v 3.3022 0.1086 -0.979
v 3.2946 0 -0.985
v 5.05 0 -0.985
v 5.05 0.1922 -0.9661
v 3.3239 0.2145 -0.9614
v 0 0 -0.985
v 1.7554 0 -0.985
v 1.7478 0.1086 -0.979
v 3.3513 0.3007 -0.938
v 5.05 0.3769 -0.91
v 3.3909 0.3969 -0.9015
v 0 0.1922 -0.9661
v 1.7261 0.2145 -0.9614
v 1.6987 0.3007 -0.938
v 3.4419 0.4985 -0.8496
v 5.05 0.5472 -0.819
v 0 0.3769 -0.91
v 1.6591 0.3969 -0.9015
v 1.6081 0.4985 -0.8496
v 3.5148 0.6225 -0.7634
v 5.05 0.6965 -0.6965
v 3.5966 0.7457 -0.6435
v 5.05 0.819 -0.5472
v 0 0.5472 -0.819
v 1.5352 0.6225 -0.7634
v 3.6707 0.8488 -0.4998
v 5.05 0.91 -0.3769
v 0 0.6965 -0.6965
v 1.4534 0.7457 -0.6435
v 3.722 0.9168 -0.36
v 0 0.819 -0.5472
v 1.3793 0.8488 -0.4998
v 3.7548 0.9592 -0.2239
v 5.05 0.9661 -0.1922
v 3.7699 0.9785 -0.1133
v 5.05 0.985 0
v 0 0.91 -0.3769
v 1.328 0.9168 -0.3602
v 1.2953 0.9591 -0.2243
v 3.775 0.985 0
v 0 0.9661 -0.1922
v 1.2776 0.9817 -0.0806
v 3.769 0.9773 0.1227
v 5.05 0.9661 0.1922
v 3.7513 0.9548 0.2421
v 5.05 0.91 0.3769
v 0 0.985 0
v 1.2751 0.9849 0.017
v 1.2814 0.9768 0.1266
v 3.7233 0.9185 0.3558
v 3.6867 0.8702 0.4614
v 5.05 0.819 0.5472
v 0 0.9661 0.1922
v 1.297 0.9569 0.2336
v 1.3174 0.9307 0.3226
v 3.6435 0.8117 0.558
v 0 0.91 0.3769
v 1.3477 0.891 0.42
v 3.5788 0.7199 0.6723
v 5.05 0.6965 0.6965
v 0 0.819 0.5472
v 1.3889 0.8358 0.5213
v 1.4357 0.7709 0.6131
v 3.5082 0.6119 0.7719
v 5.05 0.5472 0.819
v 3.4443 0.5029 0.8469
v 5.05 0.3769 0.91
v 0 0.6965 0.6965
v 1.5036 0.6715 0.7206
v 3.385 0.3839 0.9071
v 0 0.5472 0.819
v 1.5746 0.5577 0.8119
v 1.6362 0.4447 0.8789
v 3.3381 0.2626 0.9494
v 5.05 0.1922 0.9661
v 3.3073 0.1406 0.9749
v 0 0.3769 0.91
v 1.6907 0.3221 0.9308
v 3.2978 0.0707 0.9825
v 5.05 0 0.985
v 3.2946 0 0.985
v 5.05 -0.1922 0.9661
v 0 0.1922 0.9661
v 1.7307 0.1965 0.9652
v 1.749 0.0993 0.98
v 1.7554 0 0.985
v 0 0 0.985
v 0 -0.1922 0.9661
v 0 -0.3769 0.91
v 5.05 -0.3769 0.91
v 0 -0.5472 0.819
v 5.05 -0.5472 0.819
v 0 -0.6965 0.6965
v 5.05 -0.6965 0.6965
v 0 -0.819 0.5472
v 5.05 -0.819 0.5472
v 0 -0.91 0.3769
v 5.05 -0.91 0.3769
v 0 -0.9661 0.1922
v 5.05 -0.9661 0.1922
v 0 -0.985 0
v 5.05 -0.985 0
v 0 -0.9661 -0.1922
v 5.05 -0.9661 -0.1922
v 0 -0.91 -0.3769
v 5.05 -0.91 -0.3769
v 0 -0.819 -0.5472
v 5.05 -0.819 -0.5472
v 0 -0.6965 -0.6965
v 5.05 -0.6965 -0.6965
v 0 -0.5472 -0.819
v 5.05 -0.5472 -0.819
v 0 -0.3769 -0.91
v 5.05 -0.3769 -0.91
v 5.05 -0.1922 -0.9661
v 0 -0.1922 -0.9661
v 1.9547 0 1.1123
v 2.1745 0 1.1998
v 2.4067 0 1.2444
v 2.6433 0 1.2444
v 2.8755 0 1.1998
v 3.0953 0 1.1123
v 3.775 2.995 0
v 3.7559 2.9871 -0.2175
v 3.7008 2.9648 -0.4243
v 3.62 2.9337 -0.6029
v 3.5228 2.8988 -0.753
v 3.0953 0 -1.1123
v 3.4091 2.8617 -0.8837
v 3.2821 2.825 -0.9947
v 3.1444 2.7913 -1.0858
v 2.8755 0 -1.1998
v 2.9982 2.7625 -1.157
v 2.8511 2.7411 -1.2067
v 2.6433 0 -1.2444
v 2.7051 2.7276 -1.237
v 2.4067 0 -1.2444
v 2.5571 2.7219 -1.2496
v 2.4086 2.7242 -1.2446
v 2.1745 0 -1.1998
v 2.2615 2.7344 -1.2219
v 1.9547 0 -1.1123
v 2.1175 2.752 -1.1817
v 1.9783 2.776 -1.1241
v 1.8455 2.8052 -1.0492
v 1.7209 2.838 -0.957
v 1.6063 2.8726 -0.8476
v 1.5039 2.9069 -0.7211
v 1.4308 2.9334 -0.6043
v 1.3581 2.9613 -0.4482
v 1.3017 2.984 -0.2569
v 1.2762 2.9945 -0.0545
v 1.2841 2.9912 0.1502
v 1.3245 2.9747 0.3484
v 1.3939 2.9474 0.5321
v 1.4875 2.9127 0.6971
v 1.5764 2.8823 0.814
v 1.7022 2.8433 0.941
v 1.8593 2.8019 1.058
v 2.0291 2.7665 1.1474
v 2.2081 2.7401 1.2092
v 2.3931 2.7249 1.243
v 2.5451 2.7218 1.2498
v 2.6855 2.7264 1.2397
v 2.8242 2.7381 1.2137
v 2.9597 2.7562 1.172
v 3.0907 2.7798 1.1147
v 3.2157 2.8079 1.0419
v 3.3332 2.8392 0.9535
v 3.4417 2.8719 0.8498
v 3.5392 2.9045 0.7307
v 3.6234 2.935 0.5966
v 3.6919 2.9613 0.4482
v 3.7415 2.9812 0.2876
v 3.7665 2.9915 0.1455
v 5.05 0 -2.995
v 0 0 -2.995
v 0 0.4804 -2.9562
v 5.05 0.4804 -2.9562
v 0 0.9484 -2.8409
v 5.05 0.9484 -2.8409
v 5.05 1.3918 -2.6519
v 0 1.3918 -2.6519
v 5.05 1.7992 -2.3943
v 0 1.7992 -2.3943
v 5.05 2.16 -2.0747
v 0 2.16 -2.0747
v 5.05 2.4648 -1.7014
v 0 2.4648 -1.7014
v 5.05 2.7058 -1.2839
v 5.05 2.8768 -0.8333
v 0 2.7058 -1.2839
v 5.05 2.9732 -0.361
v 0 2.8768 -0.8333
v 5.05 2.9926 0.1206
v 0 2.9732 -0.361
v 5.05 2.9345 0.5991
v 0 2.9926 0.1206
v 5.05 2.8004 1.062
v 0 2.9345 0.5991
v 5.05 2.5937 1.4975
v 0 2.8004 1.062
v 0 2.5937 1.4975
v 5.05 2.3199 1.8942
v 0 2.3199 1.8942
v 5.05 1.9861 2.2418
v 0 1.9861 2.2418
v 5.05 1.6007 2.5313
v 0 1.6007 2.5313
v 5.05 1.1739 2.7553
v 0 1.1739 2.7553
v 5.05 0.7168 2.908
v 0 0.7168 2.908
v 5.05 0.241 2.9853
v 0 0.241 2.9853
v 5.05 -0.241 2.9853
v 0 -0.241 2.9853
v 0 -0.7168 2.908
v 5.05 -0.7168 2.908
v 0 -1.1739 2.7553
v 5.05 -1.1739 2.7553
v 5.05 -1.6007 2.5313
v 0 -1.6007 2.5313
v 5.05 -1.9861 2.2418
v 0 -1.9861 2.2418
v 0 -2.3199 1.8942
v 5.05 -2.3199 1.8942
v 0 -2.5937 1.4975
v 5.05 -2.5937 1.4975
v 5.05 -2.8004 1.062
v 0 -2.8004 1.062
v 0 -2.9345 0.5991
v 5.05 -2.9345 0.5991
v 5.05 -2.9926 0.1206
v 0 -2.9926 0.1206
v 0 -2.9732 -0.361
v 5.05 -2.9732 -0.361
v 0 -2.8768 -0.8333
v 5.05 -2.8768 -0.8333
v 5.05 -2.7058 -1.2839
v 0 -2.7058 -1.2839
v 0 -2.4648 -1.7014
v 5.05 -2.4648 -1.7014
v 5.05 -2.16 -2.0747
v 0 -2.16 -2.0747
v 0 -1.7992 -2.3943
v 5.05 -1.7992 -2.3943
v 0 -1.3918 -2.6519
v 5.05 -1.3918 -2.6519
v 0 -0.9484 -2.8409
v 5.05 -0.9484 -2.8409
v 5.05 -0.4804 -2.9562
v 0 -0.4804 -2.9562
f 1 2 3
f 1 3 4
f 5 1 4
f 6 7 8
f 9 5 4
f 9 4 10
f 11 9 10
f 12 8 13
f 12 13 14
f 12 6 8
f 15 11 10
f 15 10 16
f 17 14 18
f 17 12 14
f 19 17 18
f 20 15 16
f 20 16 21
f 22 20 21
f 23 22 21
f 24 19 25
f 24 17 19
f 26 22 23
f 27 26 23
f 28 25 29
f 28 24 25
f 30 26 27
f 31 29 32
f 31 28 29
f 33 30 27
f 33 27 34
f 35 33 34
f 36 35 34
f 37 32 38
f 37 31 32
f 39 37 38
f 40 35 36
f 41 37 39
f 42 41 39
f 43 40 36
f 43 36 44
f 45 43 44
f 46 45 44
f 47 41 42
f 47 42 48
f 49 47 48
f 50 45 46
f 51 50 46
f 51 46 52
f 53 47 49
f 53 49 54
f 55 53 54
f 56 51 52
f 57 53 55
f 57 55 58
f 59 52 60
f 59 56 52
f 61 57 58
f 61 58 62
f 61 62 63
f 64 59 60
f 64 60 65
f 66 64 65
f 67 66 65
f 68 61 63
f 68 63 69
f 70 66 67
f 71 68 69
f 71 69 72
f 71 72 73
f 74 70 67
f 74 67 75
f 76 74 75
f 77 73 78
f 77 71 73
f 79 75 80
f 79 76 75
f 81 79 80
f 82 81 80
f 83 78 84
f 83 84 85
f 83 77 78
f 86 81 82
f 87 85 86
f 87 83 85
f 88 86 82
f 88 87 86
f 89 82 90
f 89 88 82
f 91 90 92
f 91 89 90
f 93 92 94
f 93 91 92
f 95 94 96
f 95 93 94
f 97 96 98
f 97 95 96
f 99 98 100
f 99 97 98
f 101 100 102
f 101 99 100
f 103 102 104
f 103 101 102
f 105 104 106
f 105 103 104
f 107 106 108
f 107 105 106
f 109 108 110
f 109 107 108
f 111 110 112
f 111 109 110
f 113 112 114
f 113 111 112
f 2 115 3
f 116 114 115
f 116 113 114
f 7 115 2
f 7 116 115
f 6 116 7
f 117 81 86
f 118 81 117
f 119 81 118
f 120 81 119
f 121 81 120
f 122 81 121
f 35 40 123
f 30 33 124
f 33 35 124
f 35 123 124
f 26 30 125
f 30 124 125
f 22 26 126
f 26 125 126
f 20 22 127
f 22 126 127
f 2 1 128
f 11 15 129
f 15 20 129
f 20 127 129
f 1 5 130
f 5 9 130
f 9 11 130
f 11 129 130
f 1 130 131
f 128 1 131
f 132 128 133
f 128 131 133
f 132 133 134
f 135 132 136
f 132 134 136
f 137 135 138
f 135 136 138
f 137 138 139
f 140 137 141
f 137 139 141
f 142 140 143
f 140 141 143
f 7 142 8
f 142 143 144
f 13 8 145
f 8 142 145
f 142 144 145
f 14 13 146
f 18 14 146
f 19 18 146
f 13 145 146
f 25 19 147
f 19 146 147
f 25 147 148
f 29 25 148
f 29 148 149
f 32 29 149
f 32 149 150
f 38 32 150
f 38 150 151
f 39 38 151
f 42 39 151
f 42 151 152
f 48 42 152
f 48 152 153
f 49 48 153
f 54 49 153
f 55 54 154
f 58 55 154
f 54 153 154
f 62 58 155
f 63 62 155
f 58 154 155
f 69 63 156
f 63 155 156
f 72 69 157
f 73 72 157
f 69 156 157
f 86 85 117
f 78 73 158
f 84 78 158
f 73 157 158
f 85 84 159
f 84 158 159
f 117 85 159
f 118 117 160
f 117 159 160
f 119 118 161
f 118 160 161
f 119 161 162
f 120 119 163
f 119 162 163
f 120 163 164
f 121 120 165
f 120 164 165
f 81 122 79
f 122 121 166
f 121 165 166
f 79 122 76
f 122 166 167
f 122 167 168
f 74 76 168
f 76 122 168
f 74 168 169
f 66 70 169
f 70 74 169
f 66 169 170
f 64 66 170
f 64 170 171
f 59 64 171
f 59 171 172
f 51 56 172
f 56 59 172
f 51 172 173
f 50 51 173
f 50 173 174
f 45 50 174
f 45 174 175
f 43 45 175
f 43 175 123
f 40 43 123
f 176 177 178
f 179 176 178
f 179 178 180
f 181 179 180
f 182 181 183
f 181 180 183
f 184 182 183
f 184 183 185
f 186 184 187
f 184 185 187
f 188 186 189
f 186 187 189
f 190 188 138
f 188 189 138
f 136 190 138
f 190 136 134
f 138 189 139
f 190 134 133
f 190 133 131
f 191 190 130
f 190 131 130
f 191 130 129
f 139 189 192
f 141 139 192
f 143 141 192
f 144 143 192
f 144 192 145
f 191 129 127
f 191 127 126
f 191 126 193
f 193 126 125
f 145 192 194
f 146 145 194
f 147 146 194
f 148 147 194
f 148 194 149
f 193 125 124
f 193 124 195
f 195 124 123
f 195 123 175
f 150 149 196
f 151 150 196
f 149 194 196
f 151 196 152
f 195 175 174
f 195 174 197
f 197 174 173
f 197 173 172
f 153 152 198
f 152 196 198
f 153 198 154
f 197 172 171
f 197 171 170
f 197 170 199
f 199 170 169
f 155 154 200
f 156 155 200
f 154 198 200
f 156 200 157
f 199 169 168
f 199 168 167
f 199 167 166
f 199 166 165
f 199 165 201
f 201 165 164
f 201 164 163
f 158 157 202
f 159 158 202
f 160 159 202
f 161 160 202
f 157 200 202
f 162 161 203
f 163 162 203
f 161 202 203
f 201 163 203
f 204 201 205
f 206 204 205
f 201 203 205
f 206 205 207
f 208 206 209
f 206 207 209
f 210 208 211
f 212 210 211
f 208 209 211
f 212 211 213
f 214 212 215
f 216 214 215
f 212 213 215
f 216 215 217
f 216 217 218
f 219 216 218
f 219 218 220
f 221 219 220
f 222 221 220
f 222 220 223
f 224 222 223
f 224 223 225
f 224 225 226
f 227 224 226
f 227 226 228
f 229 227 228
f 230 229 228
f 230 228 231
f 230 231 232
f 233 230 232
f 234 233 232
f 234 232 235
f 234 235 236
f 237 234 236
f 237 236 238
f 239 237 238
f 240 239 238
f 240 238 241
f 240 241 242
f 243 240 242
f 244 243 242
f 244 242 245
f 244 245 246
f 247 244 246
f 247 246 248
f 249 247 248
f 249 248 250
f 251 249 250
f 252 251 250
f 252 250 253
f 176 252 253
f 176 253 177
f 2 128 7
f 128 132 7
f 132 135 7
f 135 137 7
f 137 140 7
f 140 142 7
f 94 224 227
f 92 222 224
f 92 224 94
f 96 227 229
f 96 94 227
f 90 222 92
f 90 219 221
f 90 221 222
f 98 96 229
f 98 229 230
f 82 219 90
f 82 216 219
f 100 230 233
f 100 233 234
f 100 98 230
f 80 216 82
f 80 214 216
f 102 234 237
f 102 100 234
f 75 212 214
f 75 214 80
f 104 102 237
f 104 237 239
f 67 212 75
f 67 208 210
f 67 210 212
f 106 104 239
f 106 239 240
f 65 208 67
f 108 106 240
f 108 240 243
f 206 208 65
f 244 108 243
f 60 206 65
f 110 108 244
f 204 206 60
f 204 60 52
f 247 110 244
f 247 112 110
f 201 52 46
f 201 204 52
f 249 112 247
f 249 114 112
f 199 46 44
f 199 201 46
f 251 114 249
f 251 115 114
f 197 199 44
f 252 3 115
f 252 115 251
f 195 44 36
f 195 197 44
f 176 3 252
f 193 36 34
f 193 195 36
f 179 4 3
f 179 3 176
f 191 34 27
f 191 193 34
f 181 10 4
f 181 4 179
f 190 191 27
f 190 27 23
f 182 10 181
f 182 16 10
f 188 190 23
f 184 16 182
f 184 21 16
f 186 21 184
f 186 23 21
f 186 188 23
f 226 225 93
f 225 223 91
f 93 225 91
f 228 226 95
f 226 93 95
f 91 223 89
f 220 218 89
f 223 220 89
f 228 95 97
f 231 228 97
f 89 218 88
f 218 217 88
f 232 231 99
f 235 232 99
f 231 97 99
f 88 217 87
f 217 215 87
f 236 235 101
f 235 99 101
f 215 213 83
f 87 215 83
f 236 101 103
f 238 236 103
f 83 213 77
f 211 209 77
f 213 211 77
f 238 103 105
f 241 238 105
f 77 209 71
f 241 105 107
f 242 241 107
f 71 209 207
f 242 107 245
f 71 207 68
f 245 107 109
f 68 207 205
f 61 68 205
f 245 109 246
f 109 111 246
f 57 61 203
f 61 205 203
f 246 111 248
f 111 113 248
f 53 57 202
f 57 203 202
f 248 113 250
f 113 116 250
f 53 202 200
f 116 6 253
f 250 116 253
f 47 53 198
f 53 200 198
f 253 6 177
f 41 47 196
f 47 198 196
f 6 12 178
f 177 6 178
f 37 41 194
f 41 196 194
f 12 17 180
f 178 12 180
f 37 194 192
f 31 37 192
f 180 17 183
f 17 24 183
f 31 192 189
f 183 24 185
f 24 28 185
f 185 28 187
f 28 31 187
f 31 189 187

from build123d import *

# Parameters (mm, degrees)
SCHIZZO1_R                        = 2.995
SCHIZZO1_R_2                      = 0.985
ESTRUSIONE_ESTRUSIONE1_DEPTH      = 5.05
FORO_FILETTATO_M3X0_5_1_OUTLINE_W = 1.25
FORO_FILETTATO_M3X0_5_1_OUTLINE_H = 2.995111585


# Read off the part's stored shape, not the designer's step: Foro filettato M3x0.5-1
with BuildPart() as part:
    # Schizzo1 → Estrusione-Estrusione1 (new body)
    with BuildSketch(Plane(origin=(0, 0, 0), x_dir=(0, 0, -1), z_dir=(1, 0, 0))):
        Circle(SCHIZZO1_R)
        Circle(SCHIZZO1_R_2, mode=Mode.SUBTRACT)
    extrude(amount=ESTRUSIONE_ESTRUSIONE1_DEPTH)

    # Foro filettato M3x0.5-1 outline → Foro filettato M3x0.5-1 (revolve, cut)
    with BuildSketch(Plane(origin=(2.525, 0, 0), x_dir=(1, 0, 0), z_dir=(0, 0, 1))):
        with Locations((0.625, 1.497555793)):
            Rectangle(FORO_FILETTATO_M3X0_5_1_OUTLINE_W, FORO_FILETTATO_M3X0_5_1_OUTLINE_H)
    revolve(axis=Axis((2.525, 0, 0), (0, 1, 0)), mode=Mode.SUBTRACT)


solid = part.part
